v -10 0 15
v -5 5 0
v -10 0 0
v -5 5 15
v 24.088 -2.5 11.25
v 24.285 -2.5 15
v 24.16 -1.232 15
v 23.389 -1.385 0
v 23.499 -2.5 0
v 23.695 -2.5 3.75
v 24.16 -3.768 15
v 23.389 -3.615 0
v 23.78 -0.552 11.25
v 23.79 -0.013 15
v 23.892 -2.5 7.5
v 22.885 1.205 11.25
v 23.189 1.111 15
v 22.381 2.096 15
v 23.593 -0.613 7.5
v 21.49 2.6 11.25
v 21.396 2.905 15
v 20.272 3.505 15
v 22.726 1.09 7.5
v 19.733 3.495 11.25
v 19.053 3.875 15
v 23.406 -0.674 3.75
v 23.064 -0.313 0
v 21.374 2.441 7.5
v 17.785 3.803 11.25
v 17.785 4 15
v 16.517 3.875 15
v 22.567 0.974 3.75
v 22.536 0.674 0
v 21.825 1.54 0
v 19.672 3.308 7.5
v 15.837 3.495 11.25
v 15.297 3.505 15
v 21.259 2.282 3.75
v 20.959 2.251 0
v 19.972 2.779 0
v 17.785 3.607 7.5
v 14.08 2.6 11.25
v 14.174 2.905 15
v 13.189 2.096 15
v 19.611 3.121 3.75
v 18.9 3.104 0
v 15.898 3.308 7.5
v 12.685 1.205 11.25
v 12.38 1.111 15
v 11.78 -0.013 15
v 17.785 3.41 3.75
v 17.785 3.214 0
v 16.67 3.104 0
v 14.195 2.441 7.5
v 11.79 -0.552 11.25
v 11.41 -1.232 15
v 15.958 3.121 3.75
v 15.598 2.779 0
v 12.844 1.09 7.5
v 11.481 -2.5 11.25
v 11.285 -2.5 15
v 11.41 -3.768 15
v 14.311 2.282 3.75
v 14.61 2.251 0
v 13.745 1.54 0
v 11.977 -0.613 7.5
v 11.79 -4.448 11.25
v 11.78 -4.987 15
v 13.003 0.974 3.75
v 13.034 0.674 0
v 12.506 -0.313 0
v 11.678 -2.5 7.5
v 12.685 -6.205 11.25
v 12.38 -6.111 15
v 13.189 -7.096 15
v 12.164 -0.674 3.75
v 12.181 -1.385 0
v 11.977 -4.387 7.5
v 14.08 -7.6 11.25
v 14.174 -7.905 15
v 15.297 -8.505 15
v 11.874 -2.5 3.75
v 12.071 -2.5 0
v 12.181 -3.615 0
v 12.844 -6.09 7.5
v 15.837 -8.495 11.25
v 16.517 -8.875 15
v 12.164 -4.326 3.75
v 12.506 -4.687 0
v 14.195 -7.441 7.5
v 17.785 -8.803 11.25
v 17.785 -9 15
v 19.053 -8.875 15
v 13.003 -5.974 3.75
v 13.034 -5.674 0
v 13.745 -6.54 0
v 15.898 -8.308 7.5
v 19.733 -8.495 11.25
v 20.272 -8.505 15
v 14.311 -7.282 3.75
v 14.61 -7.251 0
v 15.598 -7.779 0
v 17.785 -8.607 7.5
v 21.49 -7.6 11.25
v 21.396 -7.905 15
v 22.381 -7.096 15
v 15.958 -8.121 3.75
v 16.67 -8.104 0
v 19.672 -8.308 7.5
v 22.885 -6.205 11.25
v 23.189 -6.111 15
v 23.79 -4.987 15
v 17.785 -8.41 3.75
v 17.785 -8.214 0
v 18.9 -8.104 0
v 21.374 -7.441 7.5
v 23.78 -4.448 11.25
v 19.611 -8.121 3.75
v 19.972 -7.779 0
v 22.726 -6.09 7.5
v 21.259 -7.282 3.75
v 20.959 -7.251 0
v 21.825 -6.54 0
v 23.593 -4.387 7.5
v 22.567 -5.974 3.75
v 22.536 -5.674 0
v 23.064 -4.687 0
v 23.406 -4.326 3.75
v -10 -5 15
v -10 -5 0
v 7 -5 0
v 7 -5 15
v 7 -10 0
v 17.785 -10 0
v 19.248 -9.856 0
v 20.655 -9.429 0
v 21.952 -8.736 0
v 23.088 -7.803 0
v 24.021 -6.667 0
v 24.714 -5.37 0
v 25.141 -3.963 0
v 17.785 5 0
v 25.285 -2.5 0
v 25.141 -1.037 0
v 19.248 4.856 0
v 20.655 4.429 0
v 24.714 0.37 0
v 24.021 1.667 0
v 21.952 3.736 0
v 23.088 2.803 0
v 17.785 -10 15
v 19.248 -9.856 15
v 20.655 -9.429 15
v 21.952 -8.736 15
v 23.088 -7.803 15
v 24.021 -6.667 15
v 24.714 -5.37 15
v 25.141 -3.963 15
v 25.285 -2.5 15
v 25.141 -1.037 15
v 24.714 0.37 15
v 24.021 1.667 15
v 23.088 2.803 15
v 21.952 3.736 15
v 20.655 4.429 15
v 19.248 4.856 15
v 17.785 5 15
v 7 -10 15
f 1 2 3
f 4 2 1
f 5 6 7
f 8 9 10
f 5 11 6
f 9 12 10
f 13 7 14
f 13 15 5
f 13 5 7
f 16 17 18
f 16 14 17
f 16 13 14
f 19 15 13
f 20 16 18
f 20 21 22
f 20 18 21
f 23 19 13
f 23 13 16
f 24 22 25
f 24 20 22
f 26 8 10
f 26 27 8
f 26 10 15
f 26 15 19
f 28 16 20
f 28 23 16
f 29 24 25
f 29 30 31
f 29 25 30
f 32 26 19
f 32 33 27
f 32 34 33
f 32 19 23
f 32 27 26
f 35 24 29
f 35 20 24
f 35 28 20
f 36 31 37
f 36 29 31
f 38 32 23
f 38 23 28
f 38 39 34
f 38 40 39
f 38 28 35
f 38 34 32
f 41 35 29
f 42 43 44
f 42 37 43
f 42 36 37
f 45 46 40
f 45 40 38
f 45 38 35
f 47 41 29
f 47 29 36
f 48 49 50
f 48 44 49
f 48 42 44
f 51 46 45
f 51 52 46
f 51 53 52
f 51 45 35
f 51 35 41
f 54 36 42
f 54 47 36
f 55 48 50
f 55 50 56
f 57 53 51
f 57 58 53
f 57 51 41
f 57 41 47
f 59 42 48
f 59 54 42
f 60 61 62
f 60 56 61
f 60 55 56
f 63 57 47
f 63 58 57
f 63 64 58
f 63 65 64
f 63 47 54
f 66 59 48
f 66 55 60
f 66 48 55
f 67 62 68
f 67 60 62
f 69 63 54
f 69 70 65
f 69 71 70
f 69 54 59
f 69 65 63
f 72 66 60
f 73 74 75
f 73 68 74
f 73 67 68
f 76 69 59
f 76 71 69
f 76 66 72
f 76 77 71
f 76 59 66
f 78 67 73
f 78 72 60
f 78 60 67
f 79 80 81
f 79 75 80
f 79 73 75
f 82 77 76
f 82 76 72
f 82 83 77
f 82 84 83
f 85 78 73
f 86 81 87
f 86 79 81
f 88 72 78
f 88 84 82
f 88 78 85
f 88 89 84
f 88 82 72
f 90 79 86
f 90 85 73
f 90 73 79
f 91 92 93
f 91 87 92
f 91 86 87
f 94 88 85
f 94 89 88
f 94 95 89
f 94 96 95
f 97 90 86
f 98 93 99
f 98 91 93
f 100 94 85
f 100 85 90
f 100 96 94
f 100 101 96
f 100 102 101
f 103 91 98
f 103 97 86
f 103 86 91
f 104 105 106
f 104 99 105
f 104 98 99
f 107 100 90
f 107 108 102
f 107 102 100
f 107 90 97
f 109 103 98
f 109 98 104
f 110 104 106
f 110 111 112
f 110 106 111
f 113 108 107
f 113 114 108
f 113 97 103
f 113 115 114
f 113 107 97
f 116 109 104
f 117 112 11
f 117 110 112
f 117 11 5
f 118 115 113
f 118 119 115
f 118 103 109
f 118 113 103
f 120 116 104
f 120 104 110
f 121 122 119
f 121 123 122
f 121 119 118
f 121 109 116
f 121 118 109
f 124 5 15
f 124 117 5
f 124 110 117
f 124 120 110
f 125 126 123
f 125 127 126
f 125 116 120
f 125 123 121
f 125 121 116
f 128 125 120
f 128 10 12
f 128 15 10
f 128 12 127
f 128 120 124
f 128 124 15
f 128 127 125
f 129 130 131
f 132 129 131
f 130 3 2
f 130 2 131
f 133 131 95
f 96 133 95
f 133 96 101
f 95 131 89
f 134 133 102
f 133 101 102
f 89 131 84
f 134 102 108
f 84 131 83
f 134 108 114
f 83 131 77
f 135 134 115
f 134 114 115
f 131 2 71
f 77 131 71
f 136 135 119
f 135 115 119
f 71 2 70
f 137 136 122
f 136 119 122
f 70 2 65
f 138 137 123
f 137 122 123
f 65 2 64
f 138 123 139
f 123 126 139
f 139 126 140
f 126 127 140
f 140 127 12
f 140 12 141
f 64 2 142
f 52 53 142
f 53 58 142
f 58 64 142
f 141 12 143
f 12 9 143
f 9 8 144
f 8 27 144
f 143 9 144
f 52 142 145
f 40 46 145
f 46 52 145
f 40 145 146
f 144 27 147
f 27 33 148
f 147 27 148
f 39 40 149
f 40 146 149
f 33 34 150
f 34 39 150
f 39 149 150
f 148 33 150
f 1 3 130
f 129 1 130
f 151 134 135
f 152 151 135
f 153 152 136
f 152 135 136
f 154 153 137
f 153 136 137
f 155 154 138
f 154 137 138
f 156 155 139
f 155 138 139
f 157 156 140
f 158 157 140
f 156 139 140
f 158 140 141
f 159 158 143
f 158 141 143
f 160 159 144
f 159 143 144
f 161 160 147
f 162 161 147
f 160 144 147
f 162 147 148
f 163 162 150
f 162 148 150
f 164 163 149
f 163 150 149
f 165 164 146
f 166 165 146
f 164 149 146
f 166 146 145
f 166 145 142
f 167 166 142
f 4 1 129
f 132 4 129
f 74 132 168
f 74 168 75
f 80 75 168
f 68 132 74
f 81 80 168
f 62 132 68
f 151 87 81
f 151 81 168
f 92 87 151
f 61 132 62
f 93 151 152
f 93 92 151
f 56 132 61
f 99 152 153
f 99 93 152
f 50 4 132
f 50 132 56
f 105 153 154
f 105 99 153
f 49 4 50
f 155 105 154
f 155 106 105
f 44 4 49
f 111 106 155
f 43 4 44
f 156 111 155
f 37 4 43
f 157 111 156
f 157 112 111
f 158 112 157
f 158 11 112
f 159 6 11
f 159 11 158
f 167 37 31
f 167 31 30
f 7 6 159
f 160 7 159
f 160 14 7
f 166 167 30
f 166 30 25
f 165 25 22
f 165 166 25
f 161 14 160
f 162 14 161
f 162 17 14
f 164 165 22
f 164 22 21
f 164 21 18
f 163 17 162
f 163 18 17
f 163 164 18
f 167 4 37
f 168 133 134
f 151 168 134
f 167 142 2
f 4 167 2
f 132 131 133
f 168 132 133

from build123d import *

# Parameters (mm, degrees)
F1_DEPTH = 15
F2_R     = 6.5
F3_DEPTH = 15
F3_TAPER = 3
F4_SIZE  = 5


with BuildPart() as f1:
    # F0 (on Top) → F1 (new body)
    with BuildSketch(Plane.XY):
        with BuildLine():
            Line((-10, -5), (7, -5))
            Line((7, -5), (7, -10))
            Line((7, -10), (10, -10))
            Line((10, -10), (17.7848991007, -10))
            ThreePointArc((17.7848991007, -10), (25.2848991007, -2.5), (17.7848991007, 5))
            Line((17.7848991007, 5), (10, 5))
            Line((10, 5), (-10, 5))
            Line((-10, 5), (-10, -5))
        make_face()
    extrude(amount=F1_DEPTH)

    # F2 (on face) → F3 (cut, through all)
    with BuildSketch(Plane.XY.offset(15)):
        with Locations((17.7848991007, -2.5)):
            Circle(F2_R)
    extrude(amount=-F3_DEPTH, taper=F3_TAPER, mode=Mode.SUBTRACT)

    # F4
    f4_edges = [f1.edges().sort_by_distance(p)[0] for p in [
        (-10, 5, 7.5),
    ]]
    chamfer(f4_edges, length=F4_SIZE)


solid = f1.part
